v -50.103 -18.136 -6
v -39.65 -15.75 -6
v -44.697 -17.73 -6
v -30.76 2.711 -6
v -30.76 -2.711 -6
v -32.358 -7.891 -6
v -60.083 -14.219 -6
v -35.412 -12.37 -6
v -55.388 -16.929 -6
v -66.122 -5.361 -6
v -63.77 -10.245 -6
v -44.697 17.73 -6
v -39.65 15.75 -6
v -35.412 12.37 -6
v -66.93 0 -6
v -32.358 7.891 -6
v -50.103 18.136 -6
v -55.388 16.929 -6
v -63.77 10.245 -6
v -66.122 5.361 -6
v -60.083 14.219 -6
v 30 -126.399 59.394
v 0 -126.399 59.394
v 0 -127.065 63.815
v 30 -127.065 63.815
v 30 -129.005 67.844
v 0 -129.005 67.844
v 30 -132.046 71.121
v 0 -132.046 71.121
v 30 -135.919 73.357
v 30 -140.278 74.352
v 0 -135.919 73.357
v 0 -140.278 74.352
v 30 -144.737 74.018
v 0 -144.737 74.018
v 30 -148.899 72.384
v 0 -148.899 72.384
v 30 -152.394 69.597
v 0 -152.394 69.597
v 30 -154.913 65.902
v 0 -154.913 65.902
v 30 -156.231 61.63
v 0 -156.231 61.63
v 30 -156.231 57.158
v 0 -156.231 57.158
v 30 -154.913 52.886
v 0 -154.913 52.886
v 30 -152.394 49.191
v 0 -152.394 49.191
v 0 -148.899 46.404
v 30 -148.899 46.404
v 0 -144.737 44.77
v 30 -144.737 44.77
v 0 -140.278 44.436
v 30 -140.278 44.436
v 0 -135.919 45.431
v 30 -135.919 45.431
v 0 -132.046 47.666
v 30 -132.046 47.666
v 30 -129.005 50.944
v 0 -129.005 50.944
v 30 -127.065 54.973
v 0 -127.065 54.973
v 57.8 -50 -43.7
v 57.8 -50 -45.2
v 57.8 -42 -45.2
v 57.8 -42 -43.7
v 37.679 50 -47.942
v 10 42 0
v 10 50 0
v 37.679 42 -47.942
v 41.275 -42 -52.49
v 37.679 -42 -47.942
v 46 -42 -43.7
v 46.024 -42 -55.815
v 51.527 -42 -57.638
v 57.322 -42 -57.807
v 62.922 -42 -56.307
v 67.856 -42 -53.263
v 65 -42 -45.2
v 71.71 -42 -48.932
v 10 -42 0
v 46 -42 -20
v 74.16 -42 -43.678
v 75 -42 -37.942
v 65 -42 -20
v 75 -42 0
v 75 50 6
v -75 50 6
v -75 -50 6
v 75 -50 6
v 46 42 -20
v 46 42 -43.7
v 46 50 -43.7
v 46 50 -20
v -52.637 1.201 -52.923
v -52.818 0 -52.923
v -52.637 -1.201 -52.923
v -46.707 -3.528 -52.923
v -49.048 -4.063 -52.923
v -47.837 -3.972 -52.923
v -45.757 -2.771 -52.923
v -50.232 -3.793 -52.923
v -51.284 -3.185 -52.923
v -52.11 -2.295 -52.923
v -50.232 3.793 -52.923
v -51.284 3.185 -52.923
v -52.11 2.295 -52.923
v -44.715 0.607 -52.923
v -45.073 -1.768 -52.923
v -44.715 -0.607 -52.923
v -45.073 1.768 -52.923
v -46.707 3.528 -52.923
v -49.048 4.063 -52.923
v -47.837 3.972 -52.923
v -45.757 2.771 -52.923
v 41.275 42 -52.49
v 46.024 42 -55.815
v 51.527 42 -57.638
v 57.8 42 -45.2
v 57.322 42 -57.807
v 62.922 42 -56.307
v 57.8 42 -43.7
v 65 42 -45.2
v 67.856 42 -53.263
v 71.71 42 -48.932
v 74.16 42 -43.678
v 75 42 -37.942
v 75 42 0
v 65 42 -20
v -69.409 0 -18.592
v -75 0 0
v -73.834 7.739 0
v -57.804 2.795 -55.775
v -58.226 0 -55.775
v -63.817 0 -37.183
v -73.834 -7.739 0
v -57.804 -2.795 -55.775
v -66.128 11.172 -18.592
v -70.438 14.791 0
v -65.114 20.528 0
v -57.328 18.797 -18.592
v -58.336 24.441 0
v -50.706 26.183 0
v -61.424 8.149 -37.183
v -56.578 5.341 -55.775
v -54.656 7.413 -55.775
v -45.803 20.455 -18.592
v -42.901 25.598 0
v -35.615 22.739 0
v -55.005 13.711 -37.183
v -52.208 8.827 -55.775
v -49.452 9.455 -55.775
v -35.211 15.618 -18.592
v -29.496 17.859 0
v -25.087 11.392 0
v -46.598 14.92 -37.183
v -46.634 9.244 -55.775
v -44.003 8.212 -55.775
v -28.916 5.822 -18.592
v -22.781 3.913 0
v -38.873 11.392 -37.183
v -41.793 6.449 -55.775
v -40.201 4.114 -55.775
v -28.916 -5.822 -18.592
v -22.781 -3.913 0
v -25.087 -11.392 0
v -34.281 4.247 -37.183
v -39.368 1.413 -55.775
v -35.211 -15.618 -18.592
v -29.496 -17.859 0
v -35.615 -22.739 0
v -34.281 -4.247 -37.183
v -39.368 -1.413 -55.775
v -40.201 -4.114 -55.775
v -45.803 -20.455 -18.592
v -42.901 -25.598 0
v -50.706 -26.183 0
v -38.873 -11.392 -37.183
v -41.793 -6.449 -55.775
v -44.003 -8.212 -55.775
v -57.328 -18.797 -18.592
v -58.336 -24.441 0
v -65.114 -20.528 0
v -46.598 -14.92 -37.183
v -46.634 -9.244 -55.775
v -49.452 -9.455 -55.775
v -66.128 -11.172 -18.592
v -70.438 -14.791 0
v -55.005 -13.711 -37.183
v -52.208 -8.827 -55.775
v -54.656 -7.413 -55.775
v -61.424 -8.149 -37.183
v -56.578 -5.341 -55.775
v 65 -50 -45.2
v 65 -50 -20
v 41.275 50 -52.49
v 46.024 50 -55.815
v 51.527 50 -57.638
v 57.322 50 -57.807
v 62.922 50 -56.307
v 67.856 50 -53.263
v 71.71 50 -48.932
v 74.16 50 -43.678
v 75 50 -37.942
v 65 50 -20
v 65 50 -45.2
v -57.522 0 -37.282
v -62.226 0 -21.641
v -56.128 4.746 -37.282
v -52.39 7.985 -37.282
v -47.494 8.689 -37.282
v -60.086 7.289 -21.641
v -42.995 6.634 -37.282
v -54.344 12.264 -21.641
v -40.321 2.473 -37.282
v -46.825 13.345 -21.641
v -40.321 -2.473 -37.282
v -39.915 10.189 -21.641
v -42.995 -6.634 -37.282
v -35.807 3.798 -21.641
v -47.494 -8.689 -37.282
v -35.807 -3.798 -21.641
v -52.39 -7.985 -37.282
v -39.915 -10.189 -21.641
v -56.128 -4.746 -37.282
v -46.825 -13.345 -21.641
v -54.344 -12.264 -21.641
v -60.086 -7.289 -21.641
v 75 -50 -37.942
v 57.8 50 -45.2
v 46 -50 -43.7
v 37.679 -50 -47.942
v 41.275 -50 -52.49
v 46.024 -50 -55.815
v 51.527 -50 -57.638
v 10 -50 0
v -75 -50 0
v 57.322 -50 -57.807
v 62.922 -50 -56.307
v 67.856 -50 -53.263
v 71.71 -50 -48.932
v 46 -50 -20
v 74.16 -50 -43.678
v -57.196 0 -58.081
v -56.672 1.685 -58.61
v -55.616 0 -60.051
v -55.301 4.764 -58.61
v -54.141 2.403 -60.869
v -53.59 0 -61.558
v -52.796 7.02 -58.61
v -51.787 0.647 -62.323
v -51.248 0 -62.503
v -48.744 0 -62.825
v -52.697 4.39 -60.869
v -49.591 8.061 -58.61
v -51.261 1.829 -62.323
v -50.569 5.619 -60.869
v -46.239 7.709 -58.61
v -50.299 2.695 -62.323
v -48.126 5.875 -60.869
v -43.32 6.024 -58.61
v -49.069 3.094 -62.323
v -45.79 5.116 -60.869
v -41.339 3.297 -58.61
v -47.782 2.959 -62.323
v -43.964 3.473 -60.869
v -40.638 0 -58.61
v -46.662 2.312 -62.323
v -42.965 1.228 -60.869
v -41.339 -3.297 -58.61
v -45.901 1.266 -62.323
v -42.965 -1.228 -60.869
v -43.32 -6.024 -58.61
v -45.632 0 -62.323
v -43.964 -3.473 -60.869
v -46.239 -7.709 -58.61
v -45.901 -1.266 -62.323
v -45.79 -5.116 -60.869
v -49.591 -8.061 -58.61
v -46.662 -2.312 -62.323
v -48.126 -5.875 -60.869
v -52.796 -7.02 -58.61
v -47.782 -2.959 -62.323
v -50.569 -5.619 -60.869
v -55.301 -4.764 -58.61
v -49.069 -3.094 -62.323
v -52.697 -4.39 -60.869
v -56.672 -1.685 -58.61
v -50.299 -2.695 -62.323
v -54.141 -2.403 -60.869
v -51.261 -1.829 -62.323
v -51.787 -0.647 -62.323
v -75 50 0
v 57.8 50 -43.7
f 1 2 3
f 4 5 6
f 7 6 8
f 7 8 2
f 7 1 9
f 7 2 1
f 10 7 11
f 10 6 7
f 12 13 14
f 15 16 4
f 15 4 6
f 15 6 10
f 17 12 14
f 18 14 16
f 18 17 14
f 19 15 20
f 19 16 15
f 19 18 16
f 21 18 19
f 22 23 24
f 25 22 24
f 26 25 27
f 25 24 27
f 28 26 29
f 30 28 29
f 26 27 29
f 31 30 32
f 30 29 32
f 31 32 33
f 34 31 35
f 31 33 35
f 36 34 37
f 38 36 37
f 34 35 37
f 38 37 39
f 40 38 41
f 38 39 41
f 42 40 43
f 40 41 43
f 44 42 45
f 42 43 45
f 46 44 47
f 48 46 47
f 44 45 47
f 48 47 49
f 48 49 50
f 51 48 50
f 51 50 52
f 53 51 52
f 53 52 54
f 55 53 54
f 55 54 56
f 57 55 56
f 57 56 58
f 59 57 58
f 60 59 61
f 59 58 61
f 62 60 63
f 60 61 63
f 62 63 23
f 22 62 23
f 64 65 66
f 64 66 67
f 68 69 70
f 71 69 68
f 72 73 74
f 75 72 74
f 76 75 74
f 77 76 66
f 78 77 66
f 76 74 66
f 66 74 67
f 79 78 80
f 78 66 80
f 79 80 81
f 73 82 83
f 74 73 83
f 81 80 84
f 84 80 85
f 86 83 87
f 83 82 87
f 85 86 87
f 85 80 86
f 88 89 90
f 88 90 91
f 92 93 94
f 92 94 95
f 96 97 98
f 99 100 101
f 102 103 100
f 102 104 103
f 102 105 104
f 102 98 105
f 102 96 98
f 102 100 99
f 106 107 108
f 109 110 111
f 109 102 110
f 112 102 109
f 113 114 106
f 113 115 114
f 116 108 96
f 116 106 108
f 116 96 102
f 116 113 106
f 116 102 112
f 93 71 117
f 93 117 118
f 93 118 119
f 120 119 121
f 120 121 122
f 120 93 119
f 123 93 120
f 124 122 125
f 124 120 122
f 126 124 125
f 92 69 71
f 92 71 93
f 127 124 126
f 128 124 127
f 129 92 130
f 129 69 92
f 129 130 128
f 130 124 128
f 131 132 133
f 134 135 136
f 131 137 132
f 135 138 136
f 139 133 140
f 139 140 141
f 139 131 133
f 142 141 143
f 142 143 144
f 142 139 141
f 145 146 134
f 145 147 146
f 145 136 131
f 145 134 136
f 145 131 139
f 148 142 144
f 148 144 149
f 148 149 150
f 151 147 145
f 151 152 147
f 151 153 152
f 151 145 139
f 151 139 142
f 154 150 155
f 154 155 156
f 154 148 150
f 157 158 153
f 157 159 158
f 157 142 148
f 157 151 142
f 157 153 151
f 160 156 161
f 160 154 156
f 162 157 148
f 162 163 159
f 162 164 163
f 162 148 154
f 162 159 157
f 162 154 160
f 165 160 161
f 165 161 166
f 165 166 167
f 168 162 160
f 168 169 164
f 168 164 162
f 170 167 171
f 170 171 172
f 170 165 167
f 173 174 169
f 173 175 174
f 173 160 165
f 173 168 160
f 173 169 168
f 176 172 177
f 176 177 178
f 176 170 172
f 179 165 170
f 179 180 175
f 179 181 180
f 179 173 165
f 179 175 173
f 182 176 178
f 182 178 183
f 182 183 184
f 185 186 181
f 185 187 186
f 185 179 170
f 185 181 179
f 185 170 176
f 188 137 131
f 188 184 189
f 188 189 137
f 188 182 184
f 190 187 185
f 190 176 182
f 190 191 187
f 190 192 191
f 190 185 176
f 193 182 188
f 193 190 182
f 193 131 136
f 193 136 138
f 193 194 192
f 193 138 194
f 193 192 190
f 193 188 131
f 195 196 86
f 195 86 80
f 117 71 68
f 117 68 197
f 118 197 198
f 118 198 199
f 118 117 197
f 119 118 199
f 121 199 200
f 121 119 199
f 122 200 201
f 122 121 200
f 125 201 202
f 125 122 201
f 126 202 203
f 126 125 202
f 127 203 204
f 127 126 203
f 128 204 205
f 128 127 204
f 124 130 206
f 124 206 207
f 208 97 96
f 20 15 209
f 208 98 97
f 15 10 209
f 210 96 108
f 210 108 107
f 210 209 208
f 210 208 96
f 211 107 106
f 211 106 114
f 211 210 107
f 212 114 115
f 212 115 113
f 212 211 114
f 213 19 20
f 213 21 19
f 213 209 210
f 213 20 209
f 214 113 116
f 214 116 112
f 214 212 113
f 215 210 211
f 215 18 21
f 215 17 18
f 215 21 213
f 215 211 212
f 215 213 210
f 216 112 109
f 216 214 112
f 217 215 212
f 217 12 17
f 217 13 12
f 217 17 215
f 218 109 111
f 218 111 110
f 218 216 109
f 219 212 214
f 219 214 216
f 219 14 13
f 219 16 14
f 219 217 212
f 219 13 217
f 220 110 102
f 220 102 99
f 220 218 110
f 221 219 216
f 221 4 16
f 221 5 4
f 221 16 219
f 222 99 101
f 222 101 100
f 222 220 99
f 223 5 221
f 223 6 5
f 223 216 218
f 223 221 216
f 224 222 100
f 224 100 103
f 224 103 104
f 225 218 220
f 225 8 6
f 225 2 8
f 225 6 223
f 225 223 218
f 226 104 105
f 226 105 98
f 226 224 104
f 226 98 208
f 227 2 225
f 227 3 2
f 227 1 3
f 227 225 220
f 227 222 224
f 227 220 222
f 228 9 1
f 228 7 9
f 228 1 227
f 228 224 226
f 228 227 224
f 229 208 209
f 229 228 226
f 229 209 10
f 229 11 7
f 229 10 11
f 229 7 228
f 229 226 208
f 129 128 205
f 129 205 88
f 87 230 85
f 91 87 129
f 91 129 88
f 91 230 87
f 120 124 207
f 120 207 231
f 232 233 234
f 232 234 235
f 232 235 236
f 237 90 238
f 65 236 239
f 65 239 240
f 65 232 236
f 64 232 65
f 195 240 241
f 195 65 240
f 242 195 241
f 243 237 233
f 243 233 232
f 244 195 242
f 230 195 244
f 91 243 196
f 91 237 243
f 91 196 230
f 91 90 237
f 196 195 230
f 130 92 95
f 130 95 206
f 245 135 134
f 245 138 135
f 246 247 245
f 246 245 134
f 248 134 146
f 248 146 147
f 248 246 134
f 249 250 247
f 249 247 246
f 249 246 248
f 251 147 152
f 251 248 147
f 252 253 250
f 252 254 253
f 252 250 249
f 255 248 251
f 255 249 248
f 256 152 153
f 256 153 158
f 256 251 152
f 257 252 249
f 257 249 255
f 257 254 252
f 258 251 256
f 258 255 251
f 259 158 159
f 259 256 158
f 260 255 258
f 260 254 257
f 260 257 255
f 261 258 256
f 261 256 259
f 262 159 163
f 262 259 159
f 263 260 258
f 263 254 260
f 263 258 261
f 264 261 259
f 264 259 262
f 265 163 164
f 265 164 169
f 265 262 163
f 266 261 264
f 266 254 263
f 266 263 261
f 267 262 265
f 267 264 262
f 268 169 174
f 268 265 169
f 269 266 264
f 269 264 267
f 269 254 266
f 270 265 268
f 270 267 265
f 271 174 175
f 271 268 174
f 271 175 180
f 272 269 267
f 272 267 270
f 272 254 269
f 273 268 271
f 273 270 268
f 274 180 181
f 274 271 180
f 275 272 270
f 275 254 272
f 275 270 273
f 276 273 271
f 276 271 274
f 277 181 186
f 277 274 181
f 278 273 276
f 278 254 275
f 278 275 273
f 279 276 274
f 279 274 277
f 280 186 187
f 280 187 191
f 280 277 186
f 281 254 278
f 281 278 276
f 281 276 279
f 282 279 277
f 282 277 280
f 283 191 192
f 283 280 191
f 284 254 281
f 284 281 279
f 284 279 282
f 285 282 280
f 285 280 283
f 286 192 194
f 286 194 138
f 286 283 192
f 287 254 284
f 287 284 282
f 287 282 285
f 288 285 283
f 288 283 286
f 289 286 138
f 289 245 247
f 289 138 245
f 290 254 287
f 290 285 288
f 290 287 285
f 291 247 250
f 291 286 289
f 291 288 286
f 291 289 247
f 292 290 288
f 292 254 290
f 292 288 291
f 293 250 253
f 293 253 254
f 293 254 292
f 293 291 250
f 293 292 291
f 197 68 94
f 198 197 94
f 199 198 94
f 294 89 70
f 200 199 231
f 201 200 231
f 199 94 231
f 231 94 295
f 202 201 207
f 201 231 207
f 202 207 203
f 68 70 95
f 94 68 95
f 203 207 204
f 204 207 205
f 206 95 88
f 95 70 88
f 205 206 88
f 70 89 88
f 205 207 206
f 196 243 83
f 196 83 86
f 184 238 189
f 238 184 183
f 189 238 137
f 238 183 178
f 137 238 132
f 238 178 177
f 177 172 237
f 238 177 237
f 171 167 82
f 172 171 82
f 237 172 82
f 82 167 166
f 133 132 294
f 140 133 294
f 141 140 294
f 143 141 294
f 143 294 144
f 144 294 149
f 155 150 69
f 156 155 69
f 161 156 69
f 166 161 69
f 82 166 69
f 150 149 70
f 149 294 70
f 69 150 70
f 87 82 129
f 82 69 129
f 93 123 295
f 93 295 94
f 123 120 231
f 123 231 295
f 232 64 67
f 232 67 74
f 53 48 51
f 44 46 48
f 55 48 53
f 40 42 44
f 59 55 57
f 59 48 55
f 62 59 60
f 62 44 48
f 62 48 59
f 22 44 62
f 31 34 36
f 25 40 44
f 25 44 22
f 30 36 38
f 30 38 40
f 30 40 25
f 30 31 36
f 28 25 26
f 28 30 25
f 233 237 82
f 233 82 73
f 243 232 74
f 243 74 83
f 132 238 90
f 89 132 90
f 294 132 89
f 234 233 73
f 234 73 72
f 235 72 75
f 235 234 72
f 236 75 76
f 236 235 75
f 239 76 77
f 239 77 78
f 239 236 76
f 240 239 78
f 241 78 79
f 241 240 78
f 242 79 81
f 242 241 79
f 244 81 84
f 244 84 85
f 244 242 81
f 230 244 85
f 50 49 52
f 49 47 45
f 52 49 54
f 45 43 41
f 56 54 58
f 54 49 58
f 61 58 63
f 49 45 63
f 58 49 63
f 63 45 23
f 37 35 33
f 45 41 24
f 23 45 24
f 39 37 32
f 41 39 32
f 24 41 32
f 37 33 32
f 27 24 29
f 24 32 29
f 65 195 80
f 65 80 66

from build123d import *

# Parameters (mm, degrees)
F0_W     = 150
F0_H     = 100
F1_DEPTH = 6
F5_DEPTH = 100
F3_W     = 171.0709459866
F3_H     = 84
F6_DEPTH = 200
F8_R     = 15
F9_DEPTH = 30


with BuildPart() as f1:
    # F0 (on Top) → F1 (new body)
    with BuildSketch(Plane.XY):
        Rectangle(F0_W, F0_H)
    extrude(amount=F1_DEPTH)

    # F2 (on face) → F5 (join)
    with BuildSketch(Plane.XZ.offset(50)):
        with BuildLine():
            Line((75, 0), (10, 0))
            Line((10, 0), (37.6794919243, -47.9422863406))
            ThreePointArc((37.6794919243, -47.9422863406), (60.1763809021, -57.2608028664), (75, -37.9422863406))
            Line((75, -37.9422863406), (75, 0))
        make_face()
        Polygon((46, -20), (65, -20), (65, -45.2), (57.8, -45.2), (57.8, -43.7), (46, -43.7), align=None, mode=Mode.SUBTRACT)
    extrude(amount=-F5_DEPTH)

    # F3 (on Top) → F6 (cut)
    with BuildSketch(Plane.XY):
        with Locations((25.0738235191, 0)):
            Rectangle(F3_W, F3_H)
    extrude(amount=-F6_DEPTH, mode=Mode.SUBTRACT)

    # F4 (on Front) → F7 (revolve)
    with BuildSketch(Plane.XZ):
        with BuildLine():
            Line((-48.7436212599, 0), (-75, 0))
            Line((-75, 0), (-58.2256204143, -55.7750751688))
            ThreePointArc((-58.2256204143, -55.7750751688), (-58.2296045097, -50.0849254651), (-55.1008508317, -45.3321662722))
            Line((-55.1008508317, -45.3321662722), (-66.9300179817, -6))
            Line((-66.9300179817, -6), (-48.7436212599, -6))
            Line((-48.7436212599, -6), (-48.7436212599, 0))
        make_face()
        with BuildLine():
            ThreePointArc((-55.1008508317, -45.3321662722), (-58.2296045097, -50.0849254651), (-58.2256204143, -55.7750751688))
            ThreePointArc((-58.2256204143, -55.7750751688), (-54.6514212532, -60.8693328985), (-48.7436212599, -62.8249046049))
            Line((-48.7436212599, -62.8249046049), (-48.7436212599, -52.923359872))
            Line((-48.7436212599, -52.923359872), (-52.8177958548, -52.923359872))
            Line((-52.8177958548, -52.923359872), (-55.1008508317, -45.3321662722))
        make_face()
    revolve(axis=Axis((-48.7436212599, 0, -43.6514355242), (0, 0, -1)))


with BuildPart() as f9:
    # F8 (on Right) → F9 (new body)
    with BuildSketch(Plane.YZ):
        with Locations((-141.3987129927, 59.3939572573)):
            Circle(F8_R)
    extrude(amount=F9_DEPTH)


solid = Compound([f1.part, f9.part])
